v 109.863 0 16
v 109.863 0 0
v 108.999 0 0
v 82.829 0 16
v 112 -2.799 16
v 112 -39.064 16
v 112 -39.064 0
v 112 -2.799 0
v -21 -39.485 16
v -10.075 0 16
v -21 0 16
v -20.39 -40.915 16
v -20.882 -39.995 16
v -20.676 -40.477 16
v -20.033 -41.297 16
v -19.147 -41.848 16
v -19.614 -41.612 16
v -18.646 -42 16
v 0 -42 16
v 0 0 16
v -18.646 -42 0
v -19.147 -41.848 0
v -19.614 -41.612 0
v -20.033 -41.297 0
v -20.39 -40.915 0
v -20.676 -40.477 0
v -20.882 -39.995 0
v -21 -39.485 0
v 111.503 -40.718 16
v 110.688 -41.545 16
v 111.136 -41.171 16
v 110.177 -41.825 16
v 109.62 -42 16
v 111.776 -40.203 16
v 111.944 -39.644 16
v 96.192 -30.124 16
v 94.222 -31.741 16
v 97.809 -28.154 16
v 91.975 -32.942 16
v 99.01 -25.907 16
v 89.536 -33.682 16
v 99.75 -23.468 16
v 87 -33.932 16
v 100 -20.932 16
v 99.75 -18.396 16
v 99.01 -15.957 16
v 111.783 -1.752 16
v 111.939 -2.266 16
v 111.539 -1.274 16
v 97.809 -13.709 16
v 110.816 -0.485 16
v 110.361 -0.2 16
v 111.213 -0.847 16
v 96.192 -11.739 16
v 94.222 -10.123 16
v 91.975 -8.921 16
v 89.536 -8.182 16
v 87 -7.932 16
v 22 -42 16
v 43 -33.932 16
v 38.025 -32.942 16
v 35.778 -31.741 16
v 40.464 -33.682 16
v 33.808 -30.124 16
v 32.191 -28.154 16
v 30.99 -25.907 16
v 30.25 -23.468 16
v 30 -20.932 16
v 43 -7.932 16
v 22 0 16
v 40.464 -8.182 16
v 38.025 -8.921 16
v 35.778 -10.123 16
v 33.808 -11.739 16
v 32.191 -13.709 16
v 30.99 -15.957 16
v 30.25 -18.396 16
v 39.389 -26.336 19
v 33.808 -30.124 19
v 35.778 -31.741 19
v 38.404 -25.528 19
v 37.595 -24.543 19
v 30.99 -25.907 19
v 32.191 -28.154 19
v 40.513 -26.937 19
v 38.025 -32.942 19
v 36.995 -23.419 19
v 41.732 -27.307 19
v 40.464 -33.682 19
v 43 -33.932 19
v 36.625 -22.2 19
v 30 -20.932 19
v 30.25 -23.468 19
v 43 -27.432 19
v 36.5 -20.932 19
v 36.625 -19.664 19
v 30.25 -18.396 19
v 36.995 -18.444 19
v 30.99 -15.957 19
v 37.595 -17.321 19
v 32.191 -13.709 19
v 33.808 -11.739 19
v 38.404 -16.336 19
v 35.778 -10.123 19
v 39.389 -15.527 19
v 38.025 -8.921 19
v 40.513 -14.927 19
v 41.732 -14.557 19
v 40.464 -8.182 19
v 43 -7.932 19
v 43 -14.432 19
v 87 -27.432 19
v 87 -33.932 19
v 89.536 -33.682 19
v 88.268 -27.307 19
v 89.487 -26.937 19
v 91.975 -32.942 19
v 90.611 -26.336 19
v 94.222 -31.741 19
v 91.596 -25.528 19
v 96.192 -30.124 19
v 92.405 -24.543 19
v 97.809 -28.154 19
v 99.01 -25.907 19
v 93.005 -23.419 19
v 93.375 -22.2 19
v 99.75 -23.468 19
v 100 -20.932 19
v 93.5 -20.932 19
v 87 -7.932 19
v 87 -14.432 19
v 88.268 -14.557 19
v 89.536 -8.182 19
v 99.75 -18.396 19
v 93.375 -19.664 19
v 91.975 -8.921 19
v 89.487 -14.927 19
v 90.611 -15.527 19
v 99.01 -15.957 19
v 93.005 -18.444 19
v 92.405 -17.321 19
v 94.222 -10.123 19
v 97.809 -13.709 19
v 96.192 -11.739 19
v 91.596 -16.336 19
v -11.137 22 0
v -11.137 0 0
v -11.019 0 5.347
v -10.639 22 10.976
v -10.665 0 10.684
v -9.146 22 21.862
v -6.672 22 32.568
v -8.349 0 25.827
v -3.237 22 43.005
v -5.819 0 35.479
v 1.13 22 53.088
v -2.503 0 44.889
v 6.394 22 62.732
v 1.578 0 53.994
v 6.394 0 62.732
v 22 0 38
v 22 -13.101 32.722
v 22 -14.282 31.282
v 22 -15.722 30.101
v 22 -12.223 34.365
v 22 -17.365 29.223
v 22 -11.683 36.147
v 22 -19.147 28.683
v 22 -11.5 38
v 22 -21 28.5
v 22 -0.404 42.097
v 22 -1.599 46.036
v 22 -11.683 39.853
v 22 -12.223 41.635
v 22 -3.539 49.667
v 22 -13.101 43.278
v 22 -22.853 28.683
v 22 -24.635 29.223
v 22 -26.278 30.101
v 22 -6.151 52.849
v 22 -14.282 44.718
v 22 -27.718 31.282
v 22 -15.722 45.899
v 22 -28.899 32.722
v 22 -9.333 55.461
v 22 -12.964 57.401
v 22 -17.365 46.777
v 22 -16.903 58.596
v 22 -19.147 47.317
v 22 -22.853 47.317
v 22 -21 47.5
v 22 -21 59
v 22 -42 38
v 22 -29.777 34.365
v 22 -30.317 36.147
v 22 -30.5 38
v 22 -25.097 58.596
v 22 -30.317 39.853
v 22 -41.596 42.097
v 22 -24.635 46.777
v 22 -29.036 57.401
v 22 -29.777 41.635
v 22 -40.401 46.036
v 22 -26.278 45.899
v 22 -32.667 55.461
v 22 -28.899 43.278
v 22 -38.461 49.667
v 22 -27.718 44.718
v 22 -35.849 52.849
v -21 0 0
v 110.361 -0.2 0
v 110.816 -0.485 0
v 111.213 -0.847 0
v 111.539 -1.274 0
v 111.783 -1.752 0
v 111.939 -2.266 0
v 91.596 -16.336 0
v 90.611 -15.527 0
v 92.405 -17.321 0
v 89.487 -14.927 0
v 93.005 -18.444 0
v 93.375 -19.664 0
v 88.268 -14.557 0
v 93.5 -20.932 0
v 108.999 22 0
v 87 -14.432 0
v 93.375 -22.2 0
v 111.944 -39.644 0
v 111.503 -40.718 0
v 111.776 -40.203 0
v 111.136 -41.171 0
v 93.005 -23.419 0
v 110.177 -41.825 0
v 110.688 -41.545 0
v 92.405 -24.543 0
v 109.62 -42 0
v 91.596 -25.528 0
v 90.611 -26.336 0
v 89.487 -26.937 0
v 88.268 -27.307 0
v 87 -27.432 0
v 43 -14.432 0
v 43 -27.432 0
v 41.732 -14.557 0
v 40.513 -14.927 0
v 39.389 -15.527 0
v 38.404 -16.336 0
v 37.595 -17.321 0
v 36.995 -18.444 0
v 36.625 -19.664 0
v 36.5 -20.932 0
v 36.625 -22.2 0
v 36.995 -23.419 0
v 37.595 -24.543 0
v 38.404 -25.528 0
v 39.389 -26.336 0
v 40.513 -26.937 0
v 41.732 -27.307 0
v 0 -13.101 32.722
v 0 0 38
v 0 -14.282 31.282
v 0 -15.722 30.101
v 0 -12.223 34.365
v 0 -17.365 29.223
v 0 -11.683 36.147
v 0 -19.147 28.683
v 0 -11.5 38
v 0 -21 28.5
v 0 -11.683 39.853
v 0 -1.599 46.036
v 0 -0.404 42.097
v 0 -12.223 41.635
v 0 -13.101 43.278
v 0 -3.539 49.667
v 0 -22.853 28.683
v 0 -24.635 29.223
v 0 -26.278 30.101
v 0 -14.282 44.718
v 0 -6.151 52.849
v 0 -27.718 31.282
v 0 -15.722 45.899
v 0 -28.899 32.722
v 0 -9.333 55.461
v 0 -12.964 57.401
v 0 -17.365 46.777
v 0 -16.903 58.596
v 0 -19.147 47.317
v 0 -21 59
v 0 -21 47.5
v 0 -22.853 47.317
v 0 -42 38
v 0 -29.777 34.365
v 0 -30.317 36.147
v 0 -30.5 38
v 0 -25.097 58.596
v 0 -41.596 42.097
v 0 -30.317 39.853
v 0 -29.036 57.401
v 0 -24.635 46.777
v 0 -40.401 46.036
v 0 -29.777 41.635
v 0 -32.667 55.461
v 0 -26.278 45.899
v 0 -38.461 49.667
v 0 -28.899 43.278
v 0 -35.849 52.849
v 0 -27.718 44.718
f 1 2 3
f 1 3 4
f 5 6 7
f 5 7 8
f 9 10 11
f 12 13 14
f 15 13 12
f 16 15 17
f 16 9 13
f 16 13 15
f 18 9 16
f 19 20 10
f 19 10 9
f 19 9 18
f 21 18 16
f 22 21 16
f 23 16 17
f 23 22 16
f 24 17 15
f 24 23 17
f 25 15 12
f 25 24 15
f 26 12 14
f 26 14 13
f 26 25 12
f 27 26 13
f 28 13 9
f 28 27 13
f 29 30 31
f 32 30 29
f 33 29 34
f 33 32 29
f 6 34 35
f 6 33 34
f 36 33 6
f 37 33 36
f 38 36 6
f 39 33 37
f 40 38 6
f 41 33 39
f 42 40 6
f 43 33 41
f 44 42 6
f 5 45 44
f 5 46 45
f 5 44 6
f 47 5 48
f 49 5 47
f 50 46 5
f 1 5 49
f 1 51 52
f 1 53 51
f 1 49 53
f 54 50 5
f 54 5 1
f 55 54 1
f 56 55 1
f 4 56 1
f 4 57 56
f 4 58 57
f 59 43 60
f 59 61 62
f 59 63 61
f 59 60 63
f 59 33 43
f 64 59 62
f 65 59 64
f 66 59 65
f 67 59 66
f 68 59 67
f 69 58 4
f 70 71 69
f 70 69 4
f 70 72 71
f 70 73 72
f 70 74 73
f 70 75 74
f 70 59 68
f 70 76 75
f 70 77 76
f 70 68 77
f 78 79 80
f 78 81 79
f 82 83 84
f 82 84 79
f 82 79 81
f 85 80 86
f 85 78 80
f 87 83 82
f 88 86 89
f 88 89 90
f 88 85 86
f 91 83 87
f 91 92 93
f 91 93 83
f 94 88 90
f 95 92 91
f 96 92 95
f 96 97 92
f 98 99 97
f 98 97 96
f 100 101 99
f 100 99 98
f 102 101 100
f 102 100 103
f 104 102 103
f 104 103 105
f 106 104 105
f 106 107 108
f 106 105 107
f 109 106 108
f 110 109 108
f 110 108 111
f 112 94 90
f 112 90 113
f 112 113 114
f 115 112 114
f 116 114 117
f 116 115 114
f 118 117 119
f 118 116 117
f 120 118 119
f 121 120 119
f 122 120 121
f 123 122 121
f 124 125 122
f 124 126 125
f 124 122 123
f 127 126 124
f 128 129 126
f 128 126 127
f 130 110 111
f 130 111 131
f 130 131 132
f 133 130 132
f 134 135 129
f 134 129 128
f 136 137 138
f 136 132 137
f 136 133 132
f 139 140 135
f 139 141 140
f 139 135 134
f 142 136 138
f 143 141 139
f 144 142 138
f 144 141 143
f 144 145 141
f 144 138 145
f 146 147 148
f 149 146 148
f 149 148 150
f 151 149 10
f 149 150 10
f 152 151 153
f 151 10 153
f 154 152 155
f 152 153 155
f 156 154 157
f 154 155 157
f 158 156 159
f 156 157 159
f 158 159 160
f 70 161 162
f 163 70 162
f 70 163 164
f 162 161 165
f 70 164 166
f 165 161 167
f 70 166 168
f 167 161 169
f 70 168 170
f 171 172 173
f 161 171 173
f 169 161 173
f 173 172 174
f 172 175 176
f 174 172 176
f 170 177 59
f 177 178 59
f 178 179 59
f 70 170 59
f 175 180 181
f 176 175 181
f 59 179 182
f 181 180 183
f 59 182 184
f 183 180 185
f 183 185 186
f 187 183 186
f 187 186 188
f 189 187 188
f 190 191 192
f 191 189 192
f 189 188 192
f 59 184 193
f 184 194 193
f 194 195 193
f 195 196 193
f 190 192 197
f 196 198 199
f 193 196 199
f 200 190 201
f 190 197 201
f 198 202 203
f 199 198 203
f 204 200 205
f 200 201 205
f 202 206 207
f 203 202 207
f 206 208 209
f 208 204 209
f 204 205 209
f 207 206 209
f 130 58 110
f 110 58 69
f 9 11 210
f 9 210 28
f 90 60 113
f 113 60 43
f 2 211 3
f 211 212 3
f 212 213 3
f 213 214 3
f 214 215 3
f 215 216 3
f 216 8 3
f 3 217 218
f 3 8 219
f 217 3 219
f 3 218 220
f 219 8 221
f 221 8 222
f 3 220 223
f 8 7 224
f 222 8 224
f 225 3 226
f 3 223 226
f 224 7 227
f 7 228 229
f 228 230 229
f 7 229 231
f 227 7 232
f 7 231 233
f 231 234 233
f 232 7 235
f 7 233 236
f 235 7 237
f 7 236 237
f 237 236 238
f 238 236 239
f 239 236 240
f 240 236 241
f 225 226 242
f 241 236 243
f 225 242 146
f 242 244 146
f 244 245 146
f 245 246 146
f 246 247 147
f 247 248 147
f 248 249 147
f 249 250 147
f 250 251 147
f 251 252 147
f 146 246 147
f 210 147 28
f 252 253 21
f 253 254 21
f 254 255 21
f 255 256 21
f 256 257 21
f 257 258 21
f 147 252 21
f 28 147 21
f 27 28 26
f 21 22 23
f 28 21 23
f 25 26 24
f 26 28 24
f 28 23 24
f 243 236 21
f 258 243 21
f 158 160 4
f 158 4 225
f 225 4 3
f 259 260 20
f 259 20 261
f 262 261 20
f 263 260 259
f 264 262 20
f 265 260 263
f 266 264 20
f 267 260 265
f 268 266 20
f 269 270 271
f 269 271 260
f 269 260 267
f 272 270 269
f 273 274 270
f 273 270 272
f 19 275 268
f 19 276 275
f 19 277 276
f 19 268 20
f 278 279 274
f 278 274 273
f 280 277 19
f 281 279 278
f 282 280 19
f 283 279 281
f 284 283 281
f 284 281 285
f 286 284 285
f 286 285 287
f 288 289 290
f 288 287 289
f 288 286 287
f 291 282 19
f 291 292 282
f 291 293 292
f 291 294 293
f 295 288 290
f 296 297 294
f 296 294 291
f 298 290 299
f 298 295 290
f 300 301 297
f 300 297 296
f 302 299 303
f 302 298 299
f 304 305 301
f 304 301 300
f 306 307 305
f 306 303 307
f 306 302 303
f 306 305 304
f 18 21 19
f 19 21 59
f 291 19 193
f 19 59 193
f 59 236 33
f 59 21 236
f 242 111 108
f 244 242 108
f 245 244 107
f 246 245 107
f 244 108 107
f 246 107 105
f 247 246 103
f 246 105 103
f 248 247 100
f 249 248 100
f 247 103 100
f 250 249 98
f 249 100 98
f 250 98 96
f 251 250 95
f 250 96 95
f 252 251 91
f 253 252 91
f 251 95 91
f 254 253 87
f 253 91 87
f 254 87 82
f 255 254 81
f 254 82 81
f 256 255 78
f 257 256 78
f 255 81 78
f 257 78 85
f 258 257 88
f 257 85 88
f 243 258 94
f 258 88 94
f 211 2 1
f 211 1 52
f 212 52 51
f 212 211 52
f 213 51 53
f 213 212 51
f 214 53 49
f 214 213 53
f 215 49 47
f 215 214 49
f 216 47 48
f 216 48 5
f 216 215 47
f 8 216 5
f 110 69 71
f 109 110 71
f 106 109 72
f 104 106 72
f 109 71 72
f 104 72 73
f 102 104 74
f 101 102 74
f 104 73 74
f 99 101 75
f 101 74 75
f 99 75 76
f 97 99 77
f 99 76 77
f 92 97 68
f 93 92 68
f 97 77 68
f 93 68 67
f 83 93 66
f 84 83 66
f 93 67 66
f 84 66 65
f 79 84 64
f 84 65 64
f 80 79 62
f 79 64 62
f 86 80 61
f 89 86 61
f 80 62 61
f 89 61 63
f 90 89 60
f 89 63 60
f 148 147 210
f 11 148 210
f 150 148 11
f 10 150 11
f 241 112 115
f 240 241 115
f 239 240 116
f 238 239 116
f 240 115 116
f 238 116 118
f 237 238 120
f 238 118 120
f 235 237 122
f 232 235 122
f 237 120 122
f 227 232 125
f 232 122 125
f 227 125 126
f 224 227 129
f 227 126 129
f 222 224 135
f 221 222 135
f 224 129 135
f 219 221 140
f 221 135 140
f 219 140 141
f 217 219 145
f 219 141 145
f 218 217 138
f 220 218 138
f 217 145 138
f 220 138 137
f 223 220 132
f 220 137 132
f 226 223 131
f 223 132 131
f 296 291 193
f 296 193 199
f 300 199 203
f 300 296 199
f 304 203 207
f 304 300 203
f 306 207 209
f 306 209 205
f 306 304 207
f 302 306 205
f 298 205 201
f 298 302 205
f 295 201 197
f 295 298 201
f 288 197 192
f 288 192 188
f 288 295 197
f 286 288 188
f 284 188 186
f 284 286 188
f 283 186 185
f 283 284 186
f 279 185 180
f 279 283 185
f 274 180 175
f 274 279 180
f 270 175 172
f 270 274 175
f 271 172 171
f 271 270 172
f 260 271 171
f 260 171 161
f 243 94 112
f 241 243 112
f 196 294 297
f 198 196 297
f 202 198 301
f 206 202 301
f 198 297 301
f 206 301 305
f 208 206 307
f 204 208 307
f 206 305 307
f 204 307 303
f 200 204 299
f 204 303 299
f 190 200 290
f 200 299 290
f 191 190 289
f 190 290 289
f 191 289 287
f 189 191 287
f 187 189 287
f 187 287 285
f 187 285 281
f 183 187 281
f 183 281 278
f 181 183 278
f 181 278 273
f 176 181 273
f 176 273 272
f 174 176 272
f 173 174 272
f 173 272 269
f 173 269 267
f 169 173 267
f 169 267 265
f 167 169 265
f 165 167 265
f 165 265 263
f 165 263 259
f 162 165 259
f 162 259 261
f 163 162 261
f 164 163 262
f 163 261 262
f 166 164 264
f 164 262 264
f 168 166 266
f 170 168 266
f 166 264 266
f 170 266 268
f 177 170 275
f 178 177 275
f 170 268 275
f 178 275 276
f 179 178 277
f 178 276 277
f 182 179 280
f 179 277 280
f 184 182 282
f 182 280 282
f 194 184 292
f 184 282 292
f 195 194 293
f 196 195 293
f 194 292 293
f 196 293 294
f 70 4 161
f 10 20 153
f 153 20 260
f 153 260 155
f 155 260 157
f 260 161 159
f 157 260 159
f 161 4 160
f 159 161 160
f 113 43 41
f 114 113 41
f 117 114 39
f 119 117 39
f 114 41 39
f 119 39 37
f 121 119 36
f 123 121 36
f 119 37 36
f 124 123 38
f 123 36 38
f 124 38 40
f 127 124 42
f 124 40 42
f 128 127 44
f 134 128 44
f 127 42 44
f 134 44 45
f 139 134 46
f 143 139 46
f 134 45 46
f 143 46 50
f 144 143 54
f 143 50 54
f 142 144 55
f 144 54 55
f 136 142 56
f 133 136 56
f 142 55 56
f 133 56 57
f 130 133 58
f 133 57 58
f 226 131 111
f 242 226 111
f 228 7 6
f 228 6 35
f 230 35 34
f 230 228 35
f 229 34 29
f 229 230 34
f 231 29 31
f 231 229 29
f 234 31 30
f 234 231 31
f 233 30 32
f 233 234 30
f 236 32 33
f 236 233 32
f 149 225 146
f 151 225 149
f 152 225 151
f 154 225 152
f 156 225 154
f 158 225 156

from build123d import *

# Parameters (mm, degrees)
F0_W      = 42
F0_H      = 16
F1_DEPTH  = 112
F2_W      = 42
F2_H      = 22
F3_DEPTH  = 22
F4_R      = 9.5
F5_DEPTH  = 25
F6_W      = 42
F6_H      = 16
F7_DEPTH  = 21
F9_DEPTH  = 3
F11_DEPTH = 58
F13_DEPTH = 54
F15_DEPTH = 22


with BuildPart() as f1:
    # F0 (on Right) → F1 (new body)
    with BuildSketch(Plane.YZ):
        with Locations((-21, 8)):
            Rectangle(F0_W, F0_H)
    extrude(amount=F1_DEPTH)

    # F2 (on face) → F3 (join)
    with BuildSketch(Plane(origin=(0, 0, 0), x_dir=(0, -1, 0), z_dir=(-1, 0, 0))):
        with Locations((21, 27)):
            Rectangle(F2_W, F2_H)
        with BuildLine():
            ThreePointArc((42, 38), (21, 59), (0, 38))
            Line((0, 38), (42, 38))
        make_face()
    extrude(amount=-F3_DEPTH)

    # F4 (on face) → F5 (cut)
    with BuildSketch(Plane(origin=(0, 0, 0), x_dir=(0, -1, 0), z_dir=(-1, 0, 0))):
        with Locations((21, 38)):
            Circle(F4_R)
    extrude(amount=-F5_DEPTH, mode=Mode.SUBTRACT)

    # F6 (on face) → F7 (join)
    with BuildSketch(Plane(origin=(0, 0, 0), x_dir=(0, -1, 0), z_dir=(-1, 0, 0))):
        with Locations((21, 8)):
            Rectangle(F6_W, F6_H)
    extrude(amount=F7_DEPTH)

    # F8 (on face) → F9 (join)
    with BuildSketch(Plane.XY.offset(16)):
        with BuildLine():
            Line((87, -7.931874), (43, -7.931874))
            ThreePointArc((43, -7.931874), (30, -20.931874), (43, -33.931874))
            Line((43, -33.931874), (87, -33.931874))
            ThreePointArc((87, -33.931874), (100, -20.931874), (87, -7.931874))
        make_face()
    extrude(amount=F9_DEPTH)

    # F10 (on face) → F11 (cut)
    with BuildSketch(Plane.XY.offset(19)):
        with BuildLine():
            Line((87, -14.431874), (43, -14.431874))
            ThreePointArc((43, -14.431874), (36.5, -20.931874), (43, -27.431874))
            Line((43, -27.431874), (87, -27.431874))
            ThreePointArc((87, -27.431874), (93.5, -20.931874), (87, -14.431874))
        make_face()
    extrude(amount=-F11_DEPTH, mode=Mode.SUBTRACT)

    # F12 (on Top) → F13 (cut)
    with BuildSketch(Plane.XY):
        with BuildLine():
            Line((-18.401096, 0), (-17.609082, 0))
            ThreePointArc((-17.609082, 0), (-18.005089, 0.026252), (-18.401096, 0))
        make_face()
        with BuildLine():
            Line((-21, -39.485341), (-21, -38.642563))
            ThreePointArc((-21, -38.642563), (-21.029742, -39.063952), (-21, -39.485341))
        make_face()
        with BuildLine():
            ThreePointArc((-18.645877, -42), (-20.219818, -41.114213), (-21, -39.485341))
            Line((-21, -39.485341), (-21, -42))
            Line((-21, -42), (-18.645877, -42))
        make_face()
        with BuildLine():
            Line((108.139321, 0), (109.862531, 0))
            ThreePointArc((109.862531, 0), (109.000926, 0.126389), (108.139321, 0))
        make_face()
        with BuildLine():
            ThreePointArc((109.862531, 0), (111.385234, -1.052876), (112, -2.799083))
            Line((112, -2.799083), (112, 0))
            Line((112, 0), (109.862531, 0))
        make_face()
        with BuildLine():
            ThreePointArc((112, -39.063952), (111.330671, -40.953771), (109.620459, -42))
            Line((109.620459, -42), (112.000891, -42))
            Line((112.000891, -42), (112, -39.063952))
        make_face()
    extrude(amount=F13_DEPTH, mode=Mode.SUBTRACT)

    # F14 (on face) → F15 (join)
    with BuildSketch(Plane(origin=(0, 0, 0), x_dir=(-1, 0, 0), z_dir=(0, 1, 0))):
        with BuildLine():
            Line((-108.998536, 0), (11.137469, 0))
            ThreePointArc((11.137469, 0), (6.672089, 32.568119), (-6.39447, 62.732451))
            Line((-6.39447, 62.732451), (-108.998536, 0))
        make_face()
    extrude(amount=F15_DEPTH)


solid = f1.part
